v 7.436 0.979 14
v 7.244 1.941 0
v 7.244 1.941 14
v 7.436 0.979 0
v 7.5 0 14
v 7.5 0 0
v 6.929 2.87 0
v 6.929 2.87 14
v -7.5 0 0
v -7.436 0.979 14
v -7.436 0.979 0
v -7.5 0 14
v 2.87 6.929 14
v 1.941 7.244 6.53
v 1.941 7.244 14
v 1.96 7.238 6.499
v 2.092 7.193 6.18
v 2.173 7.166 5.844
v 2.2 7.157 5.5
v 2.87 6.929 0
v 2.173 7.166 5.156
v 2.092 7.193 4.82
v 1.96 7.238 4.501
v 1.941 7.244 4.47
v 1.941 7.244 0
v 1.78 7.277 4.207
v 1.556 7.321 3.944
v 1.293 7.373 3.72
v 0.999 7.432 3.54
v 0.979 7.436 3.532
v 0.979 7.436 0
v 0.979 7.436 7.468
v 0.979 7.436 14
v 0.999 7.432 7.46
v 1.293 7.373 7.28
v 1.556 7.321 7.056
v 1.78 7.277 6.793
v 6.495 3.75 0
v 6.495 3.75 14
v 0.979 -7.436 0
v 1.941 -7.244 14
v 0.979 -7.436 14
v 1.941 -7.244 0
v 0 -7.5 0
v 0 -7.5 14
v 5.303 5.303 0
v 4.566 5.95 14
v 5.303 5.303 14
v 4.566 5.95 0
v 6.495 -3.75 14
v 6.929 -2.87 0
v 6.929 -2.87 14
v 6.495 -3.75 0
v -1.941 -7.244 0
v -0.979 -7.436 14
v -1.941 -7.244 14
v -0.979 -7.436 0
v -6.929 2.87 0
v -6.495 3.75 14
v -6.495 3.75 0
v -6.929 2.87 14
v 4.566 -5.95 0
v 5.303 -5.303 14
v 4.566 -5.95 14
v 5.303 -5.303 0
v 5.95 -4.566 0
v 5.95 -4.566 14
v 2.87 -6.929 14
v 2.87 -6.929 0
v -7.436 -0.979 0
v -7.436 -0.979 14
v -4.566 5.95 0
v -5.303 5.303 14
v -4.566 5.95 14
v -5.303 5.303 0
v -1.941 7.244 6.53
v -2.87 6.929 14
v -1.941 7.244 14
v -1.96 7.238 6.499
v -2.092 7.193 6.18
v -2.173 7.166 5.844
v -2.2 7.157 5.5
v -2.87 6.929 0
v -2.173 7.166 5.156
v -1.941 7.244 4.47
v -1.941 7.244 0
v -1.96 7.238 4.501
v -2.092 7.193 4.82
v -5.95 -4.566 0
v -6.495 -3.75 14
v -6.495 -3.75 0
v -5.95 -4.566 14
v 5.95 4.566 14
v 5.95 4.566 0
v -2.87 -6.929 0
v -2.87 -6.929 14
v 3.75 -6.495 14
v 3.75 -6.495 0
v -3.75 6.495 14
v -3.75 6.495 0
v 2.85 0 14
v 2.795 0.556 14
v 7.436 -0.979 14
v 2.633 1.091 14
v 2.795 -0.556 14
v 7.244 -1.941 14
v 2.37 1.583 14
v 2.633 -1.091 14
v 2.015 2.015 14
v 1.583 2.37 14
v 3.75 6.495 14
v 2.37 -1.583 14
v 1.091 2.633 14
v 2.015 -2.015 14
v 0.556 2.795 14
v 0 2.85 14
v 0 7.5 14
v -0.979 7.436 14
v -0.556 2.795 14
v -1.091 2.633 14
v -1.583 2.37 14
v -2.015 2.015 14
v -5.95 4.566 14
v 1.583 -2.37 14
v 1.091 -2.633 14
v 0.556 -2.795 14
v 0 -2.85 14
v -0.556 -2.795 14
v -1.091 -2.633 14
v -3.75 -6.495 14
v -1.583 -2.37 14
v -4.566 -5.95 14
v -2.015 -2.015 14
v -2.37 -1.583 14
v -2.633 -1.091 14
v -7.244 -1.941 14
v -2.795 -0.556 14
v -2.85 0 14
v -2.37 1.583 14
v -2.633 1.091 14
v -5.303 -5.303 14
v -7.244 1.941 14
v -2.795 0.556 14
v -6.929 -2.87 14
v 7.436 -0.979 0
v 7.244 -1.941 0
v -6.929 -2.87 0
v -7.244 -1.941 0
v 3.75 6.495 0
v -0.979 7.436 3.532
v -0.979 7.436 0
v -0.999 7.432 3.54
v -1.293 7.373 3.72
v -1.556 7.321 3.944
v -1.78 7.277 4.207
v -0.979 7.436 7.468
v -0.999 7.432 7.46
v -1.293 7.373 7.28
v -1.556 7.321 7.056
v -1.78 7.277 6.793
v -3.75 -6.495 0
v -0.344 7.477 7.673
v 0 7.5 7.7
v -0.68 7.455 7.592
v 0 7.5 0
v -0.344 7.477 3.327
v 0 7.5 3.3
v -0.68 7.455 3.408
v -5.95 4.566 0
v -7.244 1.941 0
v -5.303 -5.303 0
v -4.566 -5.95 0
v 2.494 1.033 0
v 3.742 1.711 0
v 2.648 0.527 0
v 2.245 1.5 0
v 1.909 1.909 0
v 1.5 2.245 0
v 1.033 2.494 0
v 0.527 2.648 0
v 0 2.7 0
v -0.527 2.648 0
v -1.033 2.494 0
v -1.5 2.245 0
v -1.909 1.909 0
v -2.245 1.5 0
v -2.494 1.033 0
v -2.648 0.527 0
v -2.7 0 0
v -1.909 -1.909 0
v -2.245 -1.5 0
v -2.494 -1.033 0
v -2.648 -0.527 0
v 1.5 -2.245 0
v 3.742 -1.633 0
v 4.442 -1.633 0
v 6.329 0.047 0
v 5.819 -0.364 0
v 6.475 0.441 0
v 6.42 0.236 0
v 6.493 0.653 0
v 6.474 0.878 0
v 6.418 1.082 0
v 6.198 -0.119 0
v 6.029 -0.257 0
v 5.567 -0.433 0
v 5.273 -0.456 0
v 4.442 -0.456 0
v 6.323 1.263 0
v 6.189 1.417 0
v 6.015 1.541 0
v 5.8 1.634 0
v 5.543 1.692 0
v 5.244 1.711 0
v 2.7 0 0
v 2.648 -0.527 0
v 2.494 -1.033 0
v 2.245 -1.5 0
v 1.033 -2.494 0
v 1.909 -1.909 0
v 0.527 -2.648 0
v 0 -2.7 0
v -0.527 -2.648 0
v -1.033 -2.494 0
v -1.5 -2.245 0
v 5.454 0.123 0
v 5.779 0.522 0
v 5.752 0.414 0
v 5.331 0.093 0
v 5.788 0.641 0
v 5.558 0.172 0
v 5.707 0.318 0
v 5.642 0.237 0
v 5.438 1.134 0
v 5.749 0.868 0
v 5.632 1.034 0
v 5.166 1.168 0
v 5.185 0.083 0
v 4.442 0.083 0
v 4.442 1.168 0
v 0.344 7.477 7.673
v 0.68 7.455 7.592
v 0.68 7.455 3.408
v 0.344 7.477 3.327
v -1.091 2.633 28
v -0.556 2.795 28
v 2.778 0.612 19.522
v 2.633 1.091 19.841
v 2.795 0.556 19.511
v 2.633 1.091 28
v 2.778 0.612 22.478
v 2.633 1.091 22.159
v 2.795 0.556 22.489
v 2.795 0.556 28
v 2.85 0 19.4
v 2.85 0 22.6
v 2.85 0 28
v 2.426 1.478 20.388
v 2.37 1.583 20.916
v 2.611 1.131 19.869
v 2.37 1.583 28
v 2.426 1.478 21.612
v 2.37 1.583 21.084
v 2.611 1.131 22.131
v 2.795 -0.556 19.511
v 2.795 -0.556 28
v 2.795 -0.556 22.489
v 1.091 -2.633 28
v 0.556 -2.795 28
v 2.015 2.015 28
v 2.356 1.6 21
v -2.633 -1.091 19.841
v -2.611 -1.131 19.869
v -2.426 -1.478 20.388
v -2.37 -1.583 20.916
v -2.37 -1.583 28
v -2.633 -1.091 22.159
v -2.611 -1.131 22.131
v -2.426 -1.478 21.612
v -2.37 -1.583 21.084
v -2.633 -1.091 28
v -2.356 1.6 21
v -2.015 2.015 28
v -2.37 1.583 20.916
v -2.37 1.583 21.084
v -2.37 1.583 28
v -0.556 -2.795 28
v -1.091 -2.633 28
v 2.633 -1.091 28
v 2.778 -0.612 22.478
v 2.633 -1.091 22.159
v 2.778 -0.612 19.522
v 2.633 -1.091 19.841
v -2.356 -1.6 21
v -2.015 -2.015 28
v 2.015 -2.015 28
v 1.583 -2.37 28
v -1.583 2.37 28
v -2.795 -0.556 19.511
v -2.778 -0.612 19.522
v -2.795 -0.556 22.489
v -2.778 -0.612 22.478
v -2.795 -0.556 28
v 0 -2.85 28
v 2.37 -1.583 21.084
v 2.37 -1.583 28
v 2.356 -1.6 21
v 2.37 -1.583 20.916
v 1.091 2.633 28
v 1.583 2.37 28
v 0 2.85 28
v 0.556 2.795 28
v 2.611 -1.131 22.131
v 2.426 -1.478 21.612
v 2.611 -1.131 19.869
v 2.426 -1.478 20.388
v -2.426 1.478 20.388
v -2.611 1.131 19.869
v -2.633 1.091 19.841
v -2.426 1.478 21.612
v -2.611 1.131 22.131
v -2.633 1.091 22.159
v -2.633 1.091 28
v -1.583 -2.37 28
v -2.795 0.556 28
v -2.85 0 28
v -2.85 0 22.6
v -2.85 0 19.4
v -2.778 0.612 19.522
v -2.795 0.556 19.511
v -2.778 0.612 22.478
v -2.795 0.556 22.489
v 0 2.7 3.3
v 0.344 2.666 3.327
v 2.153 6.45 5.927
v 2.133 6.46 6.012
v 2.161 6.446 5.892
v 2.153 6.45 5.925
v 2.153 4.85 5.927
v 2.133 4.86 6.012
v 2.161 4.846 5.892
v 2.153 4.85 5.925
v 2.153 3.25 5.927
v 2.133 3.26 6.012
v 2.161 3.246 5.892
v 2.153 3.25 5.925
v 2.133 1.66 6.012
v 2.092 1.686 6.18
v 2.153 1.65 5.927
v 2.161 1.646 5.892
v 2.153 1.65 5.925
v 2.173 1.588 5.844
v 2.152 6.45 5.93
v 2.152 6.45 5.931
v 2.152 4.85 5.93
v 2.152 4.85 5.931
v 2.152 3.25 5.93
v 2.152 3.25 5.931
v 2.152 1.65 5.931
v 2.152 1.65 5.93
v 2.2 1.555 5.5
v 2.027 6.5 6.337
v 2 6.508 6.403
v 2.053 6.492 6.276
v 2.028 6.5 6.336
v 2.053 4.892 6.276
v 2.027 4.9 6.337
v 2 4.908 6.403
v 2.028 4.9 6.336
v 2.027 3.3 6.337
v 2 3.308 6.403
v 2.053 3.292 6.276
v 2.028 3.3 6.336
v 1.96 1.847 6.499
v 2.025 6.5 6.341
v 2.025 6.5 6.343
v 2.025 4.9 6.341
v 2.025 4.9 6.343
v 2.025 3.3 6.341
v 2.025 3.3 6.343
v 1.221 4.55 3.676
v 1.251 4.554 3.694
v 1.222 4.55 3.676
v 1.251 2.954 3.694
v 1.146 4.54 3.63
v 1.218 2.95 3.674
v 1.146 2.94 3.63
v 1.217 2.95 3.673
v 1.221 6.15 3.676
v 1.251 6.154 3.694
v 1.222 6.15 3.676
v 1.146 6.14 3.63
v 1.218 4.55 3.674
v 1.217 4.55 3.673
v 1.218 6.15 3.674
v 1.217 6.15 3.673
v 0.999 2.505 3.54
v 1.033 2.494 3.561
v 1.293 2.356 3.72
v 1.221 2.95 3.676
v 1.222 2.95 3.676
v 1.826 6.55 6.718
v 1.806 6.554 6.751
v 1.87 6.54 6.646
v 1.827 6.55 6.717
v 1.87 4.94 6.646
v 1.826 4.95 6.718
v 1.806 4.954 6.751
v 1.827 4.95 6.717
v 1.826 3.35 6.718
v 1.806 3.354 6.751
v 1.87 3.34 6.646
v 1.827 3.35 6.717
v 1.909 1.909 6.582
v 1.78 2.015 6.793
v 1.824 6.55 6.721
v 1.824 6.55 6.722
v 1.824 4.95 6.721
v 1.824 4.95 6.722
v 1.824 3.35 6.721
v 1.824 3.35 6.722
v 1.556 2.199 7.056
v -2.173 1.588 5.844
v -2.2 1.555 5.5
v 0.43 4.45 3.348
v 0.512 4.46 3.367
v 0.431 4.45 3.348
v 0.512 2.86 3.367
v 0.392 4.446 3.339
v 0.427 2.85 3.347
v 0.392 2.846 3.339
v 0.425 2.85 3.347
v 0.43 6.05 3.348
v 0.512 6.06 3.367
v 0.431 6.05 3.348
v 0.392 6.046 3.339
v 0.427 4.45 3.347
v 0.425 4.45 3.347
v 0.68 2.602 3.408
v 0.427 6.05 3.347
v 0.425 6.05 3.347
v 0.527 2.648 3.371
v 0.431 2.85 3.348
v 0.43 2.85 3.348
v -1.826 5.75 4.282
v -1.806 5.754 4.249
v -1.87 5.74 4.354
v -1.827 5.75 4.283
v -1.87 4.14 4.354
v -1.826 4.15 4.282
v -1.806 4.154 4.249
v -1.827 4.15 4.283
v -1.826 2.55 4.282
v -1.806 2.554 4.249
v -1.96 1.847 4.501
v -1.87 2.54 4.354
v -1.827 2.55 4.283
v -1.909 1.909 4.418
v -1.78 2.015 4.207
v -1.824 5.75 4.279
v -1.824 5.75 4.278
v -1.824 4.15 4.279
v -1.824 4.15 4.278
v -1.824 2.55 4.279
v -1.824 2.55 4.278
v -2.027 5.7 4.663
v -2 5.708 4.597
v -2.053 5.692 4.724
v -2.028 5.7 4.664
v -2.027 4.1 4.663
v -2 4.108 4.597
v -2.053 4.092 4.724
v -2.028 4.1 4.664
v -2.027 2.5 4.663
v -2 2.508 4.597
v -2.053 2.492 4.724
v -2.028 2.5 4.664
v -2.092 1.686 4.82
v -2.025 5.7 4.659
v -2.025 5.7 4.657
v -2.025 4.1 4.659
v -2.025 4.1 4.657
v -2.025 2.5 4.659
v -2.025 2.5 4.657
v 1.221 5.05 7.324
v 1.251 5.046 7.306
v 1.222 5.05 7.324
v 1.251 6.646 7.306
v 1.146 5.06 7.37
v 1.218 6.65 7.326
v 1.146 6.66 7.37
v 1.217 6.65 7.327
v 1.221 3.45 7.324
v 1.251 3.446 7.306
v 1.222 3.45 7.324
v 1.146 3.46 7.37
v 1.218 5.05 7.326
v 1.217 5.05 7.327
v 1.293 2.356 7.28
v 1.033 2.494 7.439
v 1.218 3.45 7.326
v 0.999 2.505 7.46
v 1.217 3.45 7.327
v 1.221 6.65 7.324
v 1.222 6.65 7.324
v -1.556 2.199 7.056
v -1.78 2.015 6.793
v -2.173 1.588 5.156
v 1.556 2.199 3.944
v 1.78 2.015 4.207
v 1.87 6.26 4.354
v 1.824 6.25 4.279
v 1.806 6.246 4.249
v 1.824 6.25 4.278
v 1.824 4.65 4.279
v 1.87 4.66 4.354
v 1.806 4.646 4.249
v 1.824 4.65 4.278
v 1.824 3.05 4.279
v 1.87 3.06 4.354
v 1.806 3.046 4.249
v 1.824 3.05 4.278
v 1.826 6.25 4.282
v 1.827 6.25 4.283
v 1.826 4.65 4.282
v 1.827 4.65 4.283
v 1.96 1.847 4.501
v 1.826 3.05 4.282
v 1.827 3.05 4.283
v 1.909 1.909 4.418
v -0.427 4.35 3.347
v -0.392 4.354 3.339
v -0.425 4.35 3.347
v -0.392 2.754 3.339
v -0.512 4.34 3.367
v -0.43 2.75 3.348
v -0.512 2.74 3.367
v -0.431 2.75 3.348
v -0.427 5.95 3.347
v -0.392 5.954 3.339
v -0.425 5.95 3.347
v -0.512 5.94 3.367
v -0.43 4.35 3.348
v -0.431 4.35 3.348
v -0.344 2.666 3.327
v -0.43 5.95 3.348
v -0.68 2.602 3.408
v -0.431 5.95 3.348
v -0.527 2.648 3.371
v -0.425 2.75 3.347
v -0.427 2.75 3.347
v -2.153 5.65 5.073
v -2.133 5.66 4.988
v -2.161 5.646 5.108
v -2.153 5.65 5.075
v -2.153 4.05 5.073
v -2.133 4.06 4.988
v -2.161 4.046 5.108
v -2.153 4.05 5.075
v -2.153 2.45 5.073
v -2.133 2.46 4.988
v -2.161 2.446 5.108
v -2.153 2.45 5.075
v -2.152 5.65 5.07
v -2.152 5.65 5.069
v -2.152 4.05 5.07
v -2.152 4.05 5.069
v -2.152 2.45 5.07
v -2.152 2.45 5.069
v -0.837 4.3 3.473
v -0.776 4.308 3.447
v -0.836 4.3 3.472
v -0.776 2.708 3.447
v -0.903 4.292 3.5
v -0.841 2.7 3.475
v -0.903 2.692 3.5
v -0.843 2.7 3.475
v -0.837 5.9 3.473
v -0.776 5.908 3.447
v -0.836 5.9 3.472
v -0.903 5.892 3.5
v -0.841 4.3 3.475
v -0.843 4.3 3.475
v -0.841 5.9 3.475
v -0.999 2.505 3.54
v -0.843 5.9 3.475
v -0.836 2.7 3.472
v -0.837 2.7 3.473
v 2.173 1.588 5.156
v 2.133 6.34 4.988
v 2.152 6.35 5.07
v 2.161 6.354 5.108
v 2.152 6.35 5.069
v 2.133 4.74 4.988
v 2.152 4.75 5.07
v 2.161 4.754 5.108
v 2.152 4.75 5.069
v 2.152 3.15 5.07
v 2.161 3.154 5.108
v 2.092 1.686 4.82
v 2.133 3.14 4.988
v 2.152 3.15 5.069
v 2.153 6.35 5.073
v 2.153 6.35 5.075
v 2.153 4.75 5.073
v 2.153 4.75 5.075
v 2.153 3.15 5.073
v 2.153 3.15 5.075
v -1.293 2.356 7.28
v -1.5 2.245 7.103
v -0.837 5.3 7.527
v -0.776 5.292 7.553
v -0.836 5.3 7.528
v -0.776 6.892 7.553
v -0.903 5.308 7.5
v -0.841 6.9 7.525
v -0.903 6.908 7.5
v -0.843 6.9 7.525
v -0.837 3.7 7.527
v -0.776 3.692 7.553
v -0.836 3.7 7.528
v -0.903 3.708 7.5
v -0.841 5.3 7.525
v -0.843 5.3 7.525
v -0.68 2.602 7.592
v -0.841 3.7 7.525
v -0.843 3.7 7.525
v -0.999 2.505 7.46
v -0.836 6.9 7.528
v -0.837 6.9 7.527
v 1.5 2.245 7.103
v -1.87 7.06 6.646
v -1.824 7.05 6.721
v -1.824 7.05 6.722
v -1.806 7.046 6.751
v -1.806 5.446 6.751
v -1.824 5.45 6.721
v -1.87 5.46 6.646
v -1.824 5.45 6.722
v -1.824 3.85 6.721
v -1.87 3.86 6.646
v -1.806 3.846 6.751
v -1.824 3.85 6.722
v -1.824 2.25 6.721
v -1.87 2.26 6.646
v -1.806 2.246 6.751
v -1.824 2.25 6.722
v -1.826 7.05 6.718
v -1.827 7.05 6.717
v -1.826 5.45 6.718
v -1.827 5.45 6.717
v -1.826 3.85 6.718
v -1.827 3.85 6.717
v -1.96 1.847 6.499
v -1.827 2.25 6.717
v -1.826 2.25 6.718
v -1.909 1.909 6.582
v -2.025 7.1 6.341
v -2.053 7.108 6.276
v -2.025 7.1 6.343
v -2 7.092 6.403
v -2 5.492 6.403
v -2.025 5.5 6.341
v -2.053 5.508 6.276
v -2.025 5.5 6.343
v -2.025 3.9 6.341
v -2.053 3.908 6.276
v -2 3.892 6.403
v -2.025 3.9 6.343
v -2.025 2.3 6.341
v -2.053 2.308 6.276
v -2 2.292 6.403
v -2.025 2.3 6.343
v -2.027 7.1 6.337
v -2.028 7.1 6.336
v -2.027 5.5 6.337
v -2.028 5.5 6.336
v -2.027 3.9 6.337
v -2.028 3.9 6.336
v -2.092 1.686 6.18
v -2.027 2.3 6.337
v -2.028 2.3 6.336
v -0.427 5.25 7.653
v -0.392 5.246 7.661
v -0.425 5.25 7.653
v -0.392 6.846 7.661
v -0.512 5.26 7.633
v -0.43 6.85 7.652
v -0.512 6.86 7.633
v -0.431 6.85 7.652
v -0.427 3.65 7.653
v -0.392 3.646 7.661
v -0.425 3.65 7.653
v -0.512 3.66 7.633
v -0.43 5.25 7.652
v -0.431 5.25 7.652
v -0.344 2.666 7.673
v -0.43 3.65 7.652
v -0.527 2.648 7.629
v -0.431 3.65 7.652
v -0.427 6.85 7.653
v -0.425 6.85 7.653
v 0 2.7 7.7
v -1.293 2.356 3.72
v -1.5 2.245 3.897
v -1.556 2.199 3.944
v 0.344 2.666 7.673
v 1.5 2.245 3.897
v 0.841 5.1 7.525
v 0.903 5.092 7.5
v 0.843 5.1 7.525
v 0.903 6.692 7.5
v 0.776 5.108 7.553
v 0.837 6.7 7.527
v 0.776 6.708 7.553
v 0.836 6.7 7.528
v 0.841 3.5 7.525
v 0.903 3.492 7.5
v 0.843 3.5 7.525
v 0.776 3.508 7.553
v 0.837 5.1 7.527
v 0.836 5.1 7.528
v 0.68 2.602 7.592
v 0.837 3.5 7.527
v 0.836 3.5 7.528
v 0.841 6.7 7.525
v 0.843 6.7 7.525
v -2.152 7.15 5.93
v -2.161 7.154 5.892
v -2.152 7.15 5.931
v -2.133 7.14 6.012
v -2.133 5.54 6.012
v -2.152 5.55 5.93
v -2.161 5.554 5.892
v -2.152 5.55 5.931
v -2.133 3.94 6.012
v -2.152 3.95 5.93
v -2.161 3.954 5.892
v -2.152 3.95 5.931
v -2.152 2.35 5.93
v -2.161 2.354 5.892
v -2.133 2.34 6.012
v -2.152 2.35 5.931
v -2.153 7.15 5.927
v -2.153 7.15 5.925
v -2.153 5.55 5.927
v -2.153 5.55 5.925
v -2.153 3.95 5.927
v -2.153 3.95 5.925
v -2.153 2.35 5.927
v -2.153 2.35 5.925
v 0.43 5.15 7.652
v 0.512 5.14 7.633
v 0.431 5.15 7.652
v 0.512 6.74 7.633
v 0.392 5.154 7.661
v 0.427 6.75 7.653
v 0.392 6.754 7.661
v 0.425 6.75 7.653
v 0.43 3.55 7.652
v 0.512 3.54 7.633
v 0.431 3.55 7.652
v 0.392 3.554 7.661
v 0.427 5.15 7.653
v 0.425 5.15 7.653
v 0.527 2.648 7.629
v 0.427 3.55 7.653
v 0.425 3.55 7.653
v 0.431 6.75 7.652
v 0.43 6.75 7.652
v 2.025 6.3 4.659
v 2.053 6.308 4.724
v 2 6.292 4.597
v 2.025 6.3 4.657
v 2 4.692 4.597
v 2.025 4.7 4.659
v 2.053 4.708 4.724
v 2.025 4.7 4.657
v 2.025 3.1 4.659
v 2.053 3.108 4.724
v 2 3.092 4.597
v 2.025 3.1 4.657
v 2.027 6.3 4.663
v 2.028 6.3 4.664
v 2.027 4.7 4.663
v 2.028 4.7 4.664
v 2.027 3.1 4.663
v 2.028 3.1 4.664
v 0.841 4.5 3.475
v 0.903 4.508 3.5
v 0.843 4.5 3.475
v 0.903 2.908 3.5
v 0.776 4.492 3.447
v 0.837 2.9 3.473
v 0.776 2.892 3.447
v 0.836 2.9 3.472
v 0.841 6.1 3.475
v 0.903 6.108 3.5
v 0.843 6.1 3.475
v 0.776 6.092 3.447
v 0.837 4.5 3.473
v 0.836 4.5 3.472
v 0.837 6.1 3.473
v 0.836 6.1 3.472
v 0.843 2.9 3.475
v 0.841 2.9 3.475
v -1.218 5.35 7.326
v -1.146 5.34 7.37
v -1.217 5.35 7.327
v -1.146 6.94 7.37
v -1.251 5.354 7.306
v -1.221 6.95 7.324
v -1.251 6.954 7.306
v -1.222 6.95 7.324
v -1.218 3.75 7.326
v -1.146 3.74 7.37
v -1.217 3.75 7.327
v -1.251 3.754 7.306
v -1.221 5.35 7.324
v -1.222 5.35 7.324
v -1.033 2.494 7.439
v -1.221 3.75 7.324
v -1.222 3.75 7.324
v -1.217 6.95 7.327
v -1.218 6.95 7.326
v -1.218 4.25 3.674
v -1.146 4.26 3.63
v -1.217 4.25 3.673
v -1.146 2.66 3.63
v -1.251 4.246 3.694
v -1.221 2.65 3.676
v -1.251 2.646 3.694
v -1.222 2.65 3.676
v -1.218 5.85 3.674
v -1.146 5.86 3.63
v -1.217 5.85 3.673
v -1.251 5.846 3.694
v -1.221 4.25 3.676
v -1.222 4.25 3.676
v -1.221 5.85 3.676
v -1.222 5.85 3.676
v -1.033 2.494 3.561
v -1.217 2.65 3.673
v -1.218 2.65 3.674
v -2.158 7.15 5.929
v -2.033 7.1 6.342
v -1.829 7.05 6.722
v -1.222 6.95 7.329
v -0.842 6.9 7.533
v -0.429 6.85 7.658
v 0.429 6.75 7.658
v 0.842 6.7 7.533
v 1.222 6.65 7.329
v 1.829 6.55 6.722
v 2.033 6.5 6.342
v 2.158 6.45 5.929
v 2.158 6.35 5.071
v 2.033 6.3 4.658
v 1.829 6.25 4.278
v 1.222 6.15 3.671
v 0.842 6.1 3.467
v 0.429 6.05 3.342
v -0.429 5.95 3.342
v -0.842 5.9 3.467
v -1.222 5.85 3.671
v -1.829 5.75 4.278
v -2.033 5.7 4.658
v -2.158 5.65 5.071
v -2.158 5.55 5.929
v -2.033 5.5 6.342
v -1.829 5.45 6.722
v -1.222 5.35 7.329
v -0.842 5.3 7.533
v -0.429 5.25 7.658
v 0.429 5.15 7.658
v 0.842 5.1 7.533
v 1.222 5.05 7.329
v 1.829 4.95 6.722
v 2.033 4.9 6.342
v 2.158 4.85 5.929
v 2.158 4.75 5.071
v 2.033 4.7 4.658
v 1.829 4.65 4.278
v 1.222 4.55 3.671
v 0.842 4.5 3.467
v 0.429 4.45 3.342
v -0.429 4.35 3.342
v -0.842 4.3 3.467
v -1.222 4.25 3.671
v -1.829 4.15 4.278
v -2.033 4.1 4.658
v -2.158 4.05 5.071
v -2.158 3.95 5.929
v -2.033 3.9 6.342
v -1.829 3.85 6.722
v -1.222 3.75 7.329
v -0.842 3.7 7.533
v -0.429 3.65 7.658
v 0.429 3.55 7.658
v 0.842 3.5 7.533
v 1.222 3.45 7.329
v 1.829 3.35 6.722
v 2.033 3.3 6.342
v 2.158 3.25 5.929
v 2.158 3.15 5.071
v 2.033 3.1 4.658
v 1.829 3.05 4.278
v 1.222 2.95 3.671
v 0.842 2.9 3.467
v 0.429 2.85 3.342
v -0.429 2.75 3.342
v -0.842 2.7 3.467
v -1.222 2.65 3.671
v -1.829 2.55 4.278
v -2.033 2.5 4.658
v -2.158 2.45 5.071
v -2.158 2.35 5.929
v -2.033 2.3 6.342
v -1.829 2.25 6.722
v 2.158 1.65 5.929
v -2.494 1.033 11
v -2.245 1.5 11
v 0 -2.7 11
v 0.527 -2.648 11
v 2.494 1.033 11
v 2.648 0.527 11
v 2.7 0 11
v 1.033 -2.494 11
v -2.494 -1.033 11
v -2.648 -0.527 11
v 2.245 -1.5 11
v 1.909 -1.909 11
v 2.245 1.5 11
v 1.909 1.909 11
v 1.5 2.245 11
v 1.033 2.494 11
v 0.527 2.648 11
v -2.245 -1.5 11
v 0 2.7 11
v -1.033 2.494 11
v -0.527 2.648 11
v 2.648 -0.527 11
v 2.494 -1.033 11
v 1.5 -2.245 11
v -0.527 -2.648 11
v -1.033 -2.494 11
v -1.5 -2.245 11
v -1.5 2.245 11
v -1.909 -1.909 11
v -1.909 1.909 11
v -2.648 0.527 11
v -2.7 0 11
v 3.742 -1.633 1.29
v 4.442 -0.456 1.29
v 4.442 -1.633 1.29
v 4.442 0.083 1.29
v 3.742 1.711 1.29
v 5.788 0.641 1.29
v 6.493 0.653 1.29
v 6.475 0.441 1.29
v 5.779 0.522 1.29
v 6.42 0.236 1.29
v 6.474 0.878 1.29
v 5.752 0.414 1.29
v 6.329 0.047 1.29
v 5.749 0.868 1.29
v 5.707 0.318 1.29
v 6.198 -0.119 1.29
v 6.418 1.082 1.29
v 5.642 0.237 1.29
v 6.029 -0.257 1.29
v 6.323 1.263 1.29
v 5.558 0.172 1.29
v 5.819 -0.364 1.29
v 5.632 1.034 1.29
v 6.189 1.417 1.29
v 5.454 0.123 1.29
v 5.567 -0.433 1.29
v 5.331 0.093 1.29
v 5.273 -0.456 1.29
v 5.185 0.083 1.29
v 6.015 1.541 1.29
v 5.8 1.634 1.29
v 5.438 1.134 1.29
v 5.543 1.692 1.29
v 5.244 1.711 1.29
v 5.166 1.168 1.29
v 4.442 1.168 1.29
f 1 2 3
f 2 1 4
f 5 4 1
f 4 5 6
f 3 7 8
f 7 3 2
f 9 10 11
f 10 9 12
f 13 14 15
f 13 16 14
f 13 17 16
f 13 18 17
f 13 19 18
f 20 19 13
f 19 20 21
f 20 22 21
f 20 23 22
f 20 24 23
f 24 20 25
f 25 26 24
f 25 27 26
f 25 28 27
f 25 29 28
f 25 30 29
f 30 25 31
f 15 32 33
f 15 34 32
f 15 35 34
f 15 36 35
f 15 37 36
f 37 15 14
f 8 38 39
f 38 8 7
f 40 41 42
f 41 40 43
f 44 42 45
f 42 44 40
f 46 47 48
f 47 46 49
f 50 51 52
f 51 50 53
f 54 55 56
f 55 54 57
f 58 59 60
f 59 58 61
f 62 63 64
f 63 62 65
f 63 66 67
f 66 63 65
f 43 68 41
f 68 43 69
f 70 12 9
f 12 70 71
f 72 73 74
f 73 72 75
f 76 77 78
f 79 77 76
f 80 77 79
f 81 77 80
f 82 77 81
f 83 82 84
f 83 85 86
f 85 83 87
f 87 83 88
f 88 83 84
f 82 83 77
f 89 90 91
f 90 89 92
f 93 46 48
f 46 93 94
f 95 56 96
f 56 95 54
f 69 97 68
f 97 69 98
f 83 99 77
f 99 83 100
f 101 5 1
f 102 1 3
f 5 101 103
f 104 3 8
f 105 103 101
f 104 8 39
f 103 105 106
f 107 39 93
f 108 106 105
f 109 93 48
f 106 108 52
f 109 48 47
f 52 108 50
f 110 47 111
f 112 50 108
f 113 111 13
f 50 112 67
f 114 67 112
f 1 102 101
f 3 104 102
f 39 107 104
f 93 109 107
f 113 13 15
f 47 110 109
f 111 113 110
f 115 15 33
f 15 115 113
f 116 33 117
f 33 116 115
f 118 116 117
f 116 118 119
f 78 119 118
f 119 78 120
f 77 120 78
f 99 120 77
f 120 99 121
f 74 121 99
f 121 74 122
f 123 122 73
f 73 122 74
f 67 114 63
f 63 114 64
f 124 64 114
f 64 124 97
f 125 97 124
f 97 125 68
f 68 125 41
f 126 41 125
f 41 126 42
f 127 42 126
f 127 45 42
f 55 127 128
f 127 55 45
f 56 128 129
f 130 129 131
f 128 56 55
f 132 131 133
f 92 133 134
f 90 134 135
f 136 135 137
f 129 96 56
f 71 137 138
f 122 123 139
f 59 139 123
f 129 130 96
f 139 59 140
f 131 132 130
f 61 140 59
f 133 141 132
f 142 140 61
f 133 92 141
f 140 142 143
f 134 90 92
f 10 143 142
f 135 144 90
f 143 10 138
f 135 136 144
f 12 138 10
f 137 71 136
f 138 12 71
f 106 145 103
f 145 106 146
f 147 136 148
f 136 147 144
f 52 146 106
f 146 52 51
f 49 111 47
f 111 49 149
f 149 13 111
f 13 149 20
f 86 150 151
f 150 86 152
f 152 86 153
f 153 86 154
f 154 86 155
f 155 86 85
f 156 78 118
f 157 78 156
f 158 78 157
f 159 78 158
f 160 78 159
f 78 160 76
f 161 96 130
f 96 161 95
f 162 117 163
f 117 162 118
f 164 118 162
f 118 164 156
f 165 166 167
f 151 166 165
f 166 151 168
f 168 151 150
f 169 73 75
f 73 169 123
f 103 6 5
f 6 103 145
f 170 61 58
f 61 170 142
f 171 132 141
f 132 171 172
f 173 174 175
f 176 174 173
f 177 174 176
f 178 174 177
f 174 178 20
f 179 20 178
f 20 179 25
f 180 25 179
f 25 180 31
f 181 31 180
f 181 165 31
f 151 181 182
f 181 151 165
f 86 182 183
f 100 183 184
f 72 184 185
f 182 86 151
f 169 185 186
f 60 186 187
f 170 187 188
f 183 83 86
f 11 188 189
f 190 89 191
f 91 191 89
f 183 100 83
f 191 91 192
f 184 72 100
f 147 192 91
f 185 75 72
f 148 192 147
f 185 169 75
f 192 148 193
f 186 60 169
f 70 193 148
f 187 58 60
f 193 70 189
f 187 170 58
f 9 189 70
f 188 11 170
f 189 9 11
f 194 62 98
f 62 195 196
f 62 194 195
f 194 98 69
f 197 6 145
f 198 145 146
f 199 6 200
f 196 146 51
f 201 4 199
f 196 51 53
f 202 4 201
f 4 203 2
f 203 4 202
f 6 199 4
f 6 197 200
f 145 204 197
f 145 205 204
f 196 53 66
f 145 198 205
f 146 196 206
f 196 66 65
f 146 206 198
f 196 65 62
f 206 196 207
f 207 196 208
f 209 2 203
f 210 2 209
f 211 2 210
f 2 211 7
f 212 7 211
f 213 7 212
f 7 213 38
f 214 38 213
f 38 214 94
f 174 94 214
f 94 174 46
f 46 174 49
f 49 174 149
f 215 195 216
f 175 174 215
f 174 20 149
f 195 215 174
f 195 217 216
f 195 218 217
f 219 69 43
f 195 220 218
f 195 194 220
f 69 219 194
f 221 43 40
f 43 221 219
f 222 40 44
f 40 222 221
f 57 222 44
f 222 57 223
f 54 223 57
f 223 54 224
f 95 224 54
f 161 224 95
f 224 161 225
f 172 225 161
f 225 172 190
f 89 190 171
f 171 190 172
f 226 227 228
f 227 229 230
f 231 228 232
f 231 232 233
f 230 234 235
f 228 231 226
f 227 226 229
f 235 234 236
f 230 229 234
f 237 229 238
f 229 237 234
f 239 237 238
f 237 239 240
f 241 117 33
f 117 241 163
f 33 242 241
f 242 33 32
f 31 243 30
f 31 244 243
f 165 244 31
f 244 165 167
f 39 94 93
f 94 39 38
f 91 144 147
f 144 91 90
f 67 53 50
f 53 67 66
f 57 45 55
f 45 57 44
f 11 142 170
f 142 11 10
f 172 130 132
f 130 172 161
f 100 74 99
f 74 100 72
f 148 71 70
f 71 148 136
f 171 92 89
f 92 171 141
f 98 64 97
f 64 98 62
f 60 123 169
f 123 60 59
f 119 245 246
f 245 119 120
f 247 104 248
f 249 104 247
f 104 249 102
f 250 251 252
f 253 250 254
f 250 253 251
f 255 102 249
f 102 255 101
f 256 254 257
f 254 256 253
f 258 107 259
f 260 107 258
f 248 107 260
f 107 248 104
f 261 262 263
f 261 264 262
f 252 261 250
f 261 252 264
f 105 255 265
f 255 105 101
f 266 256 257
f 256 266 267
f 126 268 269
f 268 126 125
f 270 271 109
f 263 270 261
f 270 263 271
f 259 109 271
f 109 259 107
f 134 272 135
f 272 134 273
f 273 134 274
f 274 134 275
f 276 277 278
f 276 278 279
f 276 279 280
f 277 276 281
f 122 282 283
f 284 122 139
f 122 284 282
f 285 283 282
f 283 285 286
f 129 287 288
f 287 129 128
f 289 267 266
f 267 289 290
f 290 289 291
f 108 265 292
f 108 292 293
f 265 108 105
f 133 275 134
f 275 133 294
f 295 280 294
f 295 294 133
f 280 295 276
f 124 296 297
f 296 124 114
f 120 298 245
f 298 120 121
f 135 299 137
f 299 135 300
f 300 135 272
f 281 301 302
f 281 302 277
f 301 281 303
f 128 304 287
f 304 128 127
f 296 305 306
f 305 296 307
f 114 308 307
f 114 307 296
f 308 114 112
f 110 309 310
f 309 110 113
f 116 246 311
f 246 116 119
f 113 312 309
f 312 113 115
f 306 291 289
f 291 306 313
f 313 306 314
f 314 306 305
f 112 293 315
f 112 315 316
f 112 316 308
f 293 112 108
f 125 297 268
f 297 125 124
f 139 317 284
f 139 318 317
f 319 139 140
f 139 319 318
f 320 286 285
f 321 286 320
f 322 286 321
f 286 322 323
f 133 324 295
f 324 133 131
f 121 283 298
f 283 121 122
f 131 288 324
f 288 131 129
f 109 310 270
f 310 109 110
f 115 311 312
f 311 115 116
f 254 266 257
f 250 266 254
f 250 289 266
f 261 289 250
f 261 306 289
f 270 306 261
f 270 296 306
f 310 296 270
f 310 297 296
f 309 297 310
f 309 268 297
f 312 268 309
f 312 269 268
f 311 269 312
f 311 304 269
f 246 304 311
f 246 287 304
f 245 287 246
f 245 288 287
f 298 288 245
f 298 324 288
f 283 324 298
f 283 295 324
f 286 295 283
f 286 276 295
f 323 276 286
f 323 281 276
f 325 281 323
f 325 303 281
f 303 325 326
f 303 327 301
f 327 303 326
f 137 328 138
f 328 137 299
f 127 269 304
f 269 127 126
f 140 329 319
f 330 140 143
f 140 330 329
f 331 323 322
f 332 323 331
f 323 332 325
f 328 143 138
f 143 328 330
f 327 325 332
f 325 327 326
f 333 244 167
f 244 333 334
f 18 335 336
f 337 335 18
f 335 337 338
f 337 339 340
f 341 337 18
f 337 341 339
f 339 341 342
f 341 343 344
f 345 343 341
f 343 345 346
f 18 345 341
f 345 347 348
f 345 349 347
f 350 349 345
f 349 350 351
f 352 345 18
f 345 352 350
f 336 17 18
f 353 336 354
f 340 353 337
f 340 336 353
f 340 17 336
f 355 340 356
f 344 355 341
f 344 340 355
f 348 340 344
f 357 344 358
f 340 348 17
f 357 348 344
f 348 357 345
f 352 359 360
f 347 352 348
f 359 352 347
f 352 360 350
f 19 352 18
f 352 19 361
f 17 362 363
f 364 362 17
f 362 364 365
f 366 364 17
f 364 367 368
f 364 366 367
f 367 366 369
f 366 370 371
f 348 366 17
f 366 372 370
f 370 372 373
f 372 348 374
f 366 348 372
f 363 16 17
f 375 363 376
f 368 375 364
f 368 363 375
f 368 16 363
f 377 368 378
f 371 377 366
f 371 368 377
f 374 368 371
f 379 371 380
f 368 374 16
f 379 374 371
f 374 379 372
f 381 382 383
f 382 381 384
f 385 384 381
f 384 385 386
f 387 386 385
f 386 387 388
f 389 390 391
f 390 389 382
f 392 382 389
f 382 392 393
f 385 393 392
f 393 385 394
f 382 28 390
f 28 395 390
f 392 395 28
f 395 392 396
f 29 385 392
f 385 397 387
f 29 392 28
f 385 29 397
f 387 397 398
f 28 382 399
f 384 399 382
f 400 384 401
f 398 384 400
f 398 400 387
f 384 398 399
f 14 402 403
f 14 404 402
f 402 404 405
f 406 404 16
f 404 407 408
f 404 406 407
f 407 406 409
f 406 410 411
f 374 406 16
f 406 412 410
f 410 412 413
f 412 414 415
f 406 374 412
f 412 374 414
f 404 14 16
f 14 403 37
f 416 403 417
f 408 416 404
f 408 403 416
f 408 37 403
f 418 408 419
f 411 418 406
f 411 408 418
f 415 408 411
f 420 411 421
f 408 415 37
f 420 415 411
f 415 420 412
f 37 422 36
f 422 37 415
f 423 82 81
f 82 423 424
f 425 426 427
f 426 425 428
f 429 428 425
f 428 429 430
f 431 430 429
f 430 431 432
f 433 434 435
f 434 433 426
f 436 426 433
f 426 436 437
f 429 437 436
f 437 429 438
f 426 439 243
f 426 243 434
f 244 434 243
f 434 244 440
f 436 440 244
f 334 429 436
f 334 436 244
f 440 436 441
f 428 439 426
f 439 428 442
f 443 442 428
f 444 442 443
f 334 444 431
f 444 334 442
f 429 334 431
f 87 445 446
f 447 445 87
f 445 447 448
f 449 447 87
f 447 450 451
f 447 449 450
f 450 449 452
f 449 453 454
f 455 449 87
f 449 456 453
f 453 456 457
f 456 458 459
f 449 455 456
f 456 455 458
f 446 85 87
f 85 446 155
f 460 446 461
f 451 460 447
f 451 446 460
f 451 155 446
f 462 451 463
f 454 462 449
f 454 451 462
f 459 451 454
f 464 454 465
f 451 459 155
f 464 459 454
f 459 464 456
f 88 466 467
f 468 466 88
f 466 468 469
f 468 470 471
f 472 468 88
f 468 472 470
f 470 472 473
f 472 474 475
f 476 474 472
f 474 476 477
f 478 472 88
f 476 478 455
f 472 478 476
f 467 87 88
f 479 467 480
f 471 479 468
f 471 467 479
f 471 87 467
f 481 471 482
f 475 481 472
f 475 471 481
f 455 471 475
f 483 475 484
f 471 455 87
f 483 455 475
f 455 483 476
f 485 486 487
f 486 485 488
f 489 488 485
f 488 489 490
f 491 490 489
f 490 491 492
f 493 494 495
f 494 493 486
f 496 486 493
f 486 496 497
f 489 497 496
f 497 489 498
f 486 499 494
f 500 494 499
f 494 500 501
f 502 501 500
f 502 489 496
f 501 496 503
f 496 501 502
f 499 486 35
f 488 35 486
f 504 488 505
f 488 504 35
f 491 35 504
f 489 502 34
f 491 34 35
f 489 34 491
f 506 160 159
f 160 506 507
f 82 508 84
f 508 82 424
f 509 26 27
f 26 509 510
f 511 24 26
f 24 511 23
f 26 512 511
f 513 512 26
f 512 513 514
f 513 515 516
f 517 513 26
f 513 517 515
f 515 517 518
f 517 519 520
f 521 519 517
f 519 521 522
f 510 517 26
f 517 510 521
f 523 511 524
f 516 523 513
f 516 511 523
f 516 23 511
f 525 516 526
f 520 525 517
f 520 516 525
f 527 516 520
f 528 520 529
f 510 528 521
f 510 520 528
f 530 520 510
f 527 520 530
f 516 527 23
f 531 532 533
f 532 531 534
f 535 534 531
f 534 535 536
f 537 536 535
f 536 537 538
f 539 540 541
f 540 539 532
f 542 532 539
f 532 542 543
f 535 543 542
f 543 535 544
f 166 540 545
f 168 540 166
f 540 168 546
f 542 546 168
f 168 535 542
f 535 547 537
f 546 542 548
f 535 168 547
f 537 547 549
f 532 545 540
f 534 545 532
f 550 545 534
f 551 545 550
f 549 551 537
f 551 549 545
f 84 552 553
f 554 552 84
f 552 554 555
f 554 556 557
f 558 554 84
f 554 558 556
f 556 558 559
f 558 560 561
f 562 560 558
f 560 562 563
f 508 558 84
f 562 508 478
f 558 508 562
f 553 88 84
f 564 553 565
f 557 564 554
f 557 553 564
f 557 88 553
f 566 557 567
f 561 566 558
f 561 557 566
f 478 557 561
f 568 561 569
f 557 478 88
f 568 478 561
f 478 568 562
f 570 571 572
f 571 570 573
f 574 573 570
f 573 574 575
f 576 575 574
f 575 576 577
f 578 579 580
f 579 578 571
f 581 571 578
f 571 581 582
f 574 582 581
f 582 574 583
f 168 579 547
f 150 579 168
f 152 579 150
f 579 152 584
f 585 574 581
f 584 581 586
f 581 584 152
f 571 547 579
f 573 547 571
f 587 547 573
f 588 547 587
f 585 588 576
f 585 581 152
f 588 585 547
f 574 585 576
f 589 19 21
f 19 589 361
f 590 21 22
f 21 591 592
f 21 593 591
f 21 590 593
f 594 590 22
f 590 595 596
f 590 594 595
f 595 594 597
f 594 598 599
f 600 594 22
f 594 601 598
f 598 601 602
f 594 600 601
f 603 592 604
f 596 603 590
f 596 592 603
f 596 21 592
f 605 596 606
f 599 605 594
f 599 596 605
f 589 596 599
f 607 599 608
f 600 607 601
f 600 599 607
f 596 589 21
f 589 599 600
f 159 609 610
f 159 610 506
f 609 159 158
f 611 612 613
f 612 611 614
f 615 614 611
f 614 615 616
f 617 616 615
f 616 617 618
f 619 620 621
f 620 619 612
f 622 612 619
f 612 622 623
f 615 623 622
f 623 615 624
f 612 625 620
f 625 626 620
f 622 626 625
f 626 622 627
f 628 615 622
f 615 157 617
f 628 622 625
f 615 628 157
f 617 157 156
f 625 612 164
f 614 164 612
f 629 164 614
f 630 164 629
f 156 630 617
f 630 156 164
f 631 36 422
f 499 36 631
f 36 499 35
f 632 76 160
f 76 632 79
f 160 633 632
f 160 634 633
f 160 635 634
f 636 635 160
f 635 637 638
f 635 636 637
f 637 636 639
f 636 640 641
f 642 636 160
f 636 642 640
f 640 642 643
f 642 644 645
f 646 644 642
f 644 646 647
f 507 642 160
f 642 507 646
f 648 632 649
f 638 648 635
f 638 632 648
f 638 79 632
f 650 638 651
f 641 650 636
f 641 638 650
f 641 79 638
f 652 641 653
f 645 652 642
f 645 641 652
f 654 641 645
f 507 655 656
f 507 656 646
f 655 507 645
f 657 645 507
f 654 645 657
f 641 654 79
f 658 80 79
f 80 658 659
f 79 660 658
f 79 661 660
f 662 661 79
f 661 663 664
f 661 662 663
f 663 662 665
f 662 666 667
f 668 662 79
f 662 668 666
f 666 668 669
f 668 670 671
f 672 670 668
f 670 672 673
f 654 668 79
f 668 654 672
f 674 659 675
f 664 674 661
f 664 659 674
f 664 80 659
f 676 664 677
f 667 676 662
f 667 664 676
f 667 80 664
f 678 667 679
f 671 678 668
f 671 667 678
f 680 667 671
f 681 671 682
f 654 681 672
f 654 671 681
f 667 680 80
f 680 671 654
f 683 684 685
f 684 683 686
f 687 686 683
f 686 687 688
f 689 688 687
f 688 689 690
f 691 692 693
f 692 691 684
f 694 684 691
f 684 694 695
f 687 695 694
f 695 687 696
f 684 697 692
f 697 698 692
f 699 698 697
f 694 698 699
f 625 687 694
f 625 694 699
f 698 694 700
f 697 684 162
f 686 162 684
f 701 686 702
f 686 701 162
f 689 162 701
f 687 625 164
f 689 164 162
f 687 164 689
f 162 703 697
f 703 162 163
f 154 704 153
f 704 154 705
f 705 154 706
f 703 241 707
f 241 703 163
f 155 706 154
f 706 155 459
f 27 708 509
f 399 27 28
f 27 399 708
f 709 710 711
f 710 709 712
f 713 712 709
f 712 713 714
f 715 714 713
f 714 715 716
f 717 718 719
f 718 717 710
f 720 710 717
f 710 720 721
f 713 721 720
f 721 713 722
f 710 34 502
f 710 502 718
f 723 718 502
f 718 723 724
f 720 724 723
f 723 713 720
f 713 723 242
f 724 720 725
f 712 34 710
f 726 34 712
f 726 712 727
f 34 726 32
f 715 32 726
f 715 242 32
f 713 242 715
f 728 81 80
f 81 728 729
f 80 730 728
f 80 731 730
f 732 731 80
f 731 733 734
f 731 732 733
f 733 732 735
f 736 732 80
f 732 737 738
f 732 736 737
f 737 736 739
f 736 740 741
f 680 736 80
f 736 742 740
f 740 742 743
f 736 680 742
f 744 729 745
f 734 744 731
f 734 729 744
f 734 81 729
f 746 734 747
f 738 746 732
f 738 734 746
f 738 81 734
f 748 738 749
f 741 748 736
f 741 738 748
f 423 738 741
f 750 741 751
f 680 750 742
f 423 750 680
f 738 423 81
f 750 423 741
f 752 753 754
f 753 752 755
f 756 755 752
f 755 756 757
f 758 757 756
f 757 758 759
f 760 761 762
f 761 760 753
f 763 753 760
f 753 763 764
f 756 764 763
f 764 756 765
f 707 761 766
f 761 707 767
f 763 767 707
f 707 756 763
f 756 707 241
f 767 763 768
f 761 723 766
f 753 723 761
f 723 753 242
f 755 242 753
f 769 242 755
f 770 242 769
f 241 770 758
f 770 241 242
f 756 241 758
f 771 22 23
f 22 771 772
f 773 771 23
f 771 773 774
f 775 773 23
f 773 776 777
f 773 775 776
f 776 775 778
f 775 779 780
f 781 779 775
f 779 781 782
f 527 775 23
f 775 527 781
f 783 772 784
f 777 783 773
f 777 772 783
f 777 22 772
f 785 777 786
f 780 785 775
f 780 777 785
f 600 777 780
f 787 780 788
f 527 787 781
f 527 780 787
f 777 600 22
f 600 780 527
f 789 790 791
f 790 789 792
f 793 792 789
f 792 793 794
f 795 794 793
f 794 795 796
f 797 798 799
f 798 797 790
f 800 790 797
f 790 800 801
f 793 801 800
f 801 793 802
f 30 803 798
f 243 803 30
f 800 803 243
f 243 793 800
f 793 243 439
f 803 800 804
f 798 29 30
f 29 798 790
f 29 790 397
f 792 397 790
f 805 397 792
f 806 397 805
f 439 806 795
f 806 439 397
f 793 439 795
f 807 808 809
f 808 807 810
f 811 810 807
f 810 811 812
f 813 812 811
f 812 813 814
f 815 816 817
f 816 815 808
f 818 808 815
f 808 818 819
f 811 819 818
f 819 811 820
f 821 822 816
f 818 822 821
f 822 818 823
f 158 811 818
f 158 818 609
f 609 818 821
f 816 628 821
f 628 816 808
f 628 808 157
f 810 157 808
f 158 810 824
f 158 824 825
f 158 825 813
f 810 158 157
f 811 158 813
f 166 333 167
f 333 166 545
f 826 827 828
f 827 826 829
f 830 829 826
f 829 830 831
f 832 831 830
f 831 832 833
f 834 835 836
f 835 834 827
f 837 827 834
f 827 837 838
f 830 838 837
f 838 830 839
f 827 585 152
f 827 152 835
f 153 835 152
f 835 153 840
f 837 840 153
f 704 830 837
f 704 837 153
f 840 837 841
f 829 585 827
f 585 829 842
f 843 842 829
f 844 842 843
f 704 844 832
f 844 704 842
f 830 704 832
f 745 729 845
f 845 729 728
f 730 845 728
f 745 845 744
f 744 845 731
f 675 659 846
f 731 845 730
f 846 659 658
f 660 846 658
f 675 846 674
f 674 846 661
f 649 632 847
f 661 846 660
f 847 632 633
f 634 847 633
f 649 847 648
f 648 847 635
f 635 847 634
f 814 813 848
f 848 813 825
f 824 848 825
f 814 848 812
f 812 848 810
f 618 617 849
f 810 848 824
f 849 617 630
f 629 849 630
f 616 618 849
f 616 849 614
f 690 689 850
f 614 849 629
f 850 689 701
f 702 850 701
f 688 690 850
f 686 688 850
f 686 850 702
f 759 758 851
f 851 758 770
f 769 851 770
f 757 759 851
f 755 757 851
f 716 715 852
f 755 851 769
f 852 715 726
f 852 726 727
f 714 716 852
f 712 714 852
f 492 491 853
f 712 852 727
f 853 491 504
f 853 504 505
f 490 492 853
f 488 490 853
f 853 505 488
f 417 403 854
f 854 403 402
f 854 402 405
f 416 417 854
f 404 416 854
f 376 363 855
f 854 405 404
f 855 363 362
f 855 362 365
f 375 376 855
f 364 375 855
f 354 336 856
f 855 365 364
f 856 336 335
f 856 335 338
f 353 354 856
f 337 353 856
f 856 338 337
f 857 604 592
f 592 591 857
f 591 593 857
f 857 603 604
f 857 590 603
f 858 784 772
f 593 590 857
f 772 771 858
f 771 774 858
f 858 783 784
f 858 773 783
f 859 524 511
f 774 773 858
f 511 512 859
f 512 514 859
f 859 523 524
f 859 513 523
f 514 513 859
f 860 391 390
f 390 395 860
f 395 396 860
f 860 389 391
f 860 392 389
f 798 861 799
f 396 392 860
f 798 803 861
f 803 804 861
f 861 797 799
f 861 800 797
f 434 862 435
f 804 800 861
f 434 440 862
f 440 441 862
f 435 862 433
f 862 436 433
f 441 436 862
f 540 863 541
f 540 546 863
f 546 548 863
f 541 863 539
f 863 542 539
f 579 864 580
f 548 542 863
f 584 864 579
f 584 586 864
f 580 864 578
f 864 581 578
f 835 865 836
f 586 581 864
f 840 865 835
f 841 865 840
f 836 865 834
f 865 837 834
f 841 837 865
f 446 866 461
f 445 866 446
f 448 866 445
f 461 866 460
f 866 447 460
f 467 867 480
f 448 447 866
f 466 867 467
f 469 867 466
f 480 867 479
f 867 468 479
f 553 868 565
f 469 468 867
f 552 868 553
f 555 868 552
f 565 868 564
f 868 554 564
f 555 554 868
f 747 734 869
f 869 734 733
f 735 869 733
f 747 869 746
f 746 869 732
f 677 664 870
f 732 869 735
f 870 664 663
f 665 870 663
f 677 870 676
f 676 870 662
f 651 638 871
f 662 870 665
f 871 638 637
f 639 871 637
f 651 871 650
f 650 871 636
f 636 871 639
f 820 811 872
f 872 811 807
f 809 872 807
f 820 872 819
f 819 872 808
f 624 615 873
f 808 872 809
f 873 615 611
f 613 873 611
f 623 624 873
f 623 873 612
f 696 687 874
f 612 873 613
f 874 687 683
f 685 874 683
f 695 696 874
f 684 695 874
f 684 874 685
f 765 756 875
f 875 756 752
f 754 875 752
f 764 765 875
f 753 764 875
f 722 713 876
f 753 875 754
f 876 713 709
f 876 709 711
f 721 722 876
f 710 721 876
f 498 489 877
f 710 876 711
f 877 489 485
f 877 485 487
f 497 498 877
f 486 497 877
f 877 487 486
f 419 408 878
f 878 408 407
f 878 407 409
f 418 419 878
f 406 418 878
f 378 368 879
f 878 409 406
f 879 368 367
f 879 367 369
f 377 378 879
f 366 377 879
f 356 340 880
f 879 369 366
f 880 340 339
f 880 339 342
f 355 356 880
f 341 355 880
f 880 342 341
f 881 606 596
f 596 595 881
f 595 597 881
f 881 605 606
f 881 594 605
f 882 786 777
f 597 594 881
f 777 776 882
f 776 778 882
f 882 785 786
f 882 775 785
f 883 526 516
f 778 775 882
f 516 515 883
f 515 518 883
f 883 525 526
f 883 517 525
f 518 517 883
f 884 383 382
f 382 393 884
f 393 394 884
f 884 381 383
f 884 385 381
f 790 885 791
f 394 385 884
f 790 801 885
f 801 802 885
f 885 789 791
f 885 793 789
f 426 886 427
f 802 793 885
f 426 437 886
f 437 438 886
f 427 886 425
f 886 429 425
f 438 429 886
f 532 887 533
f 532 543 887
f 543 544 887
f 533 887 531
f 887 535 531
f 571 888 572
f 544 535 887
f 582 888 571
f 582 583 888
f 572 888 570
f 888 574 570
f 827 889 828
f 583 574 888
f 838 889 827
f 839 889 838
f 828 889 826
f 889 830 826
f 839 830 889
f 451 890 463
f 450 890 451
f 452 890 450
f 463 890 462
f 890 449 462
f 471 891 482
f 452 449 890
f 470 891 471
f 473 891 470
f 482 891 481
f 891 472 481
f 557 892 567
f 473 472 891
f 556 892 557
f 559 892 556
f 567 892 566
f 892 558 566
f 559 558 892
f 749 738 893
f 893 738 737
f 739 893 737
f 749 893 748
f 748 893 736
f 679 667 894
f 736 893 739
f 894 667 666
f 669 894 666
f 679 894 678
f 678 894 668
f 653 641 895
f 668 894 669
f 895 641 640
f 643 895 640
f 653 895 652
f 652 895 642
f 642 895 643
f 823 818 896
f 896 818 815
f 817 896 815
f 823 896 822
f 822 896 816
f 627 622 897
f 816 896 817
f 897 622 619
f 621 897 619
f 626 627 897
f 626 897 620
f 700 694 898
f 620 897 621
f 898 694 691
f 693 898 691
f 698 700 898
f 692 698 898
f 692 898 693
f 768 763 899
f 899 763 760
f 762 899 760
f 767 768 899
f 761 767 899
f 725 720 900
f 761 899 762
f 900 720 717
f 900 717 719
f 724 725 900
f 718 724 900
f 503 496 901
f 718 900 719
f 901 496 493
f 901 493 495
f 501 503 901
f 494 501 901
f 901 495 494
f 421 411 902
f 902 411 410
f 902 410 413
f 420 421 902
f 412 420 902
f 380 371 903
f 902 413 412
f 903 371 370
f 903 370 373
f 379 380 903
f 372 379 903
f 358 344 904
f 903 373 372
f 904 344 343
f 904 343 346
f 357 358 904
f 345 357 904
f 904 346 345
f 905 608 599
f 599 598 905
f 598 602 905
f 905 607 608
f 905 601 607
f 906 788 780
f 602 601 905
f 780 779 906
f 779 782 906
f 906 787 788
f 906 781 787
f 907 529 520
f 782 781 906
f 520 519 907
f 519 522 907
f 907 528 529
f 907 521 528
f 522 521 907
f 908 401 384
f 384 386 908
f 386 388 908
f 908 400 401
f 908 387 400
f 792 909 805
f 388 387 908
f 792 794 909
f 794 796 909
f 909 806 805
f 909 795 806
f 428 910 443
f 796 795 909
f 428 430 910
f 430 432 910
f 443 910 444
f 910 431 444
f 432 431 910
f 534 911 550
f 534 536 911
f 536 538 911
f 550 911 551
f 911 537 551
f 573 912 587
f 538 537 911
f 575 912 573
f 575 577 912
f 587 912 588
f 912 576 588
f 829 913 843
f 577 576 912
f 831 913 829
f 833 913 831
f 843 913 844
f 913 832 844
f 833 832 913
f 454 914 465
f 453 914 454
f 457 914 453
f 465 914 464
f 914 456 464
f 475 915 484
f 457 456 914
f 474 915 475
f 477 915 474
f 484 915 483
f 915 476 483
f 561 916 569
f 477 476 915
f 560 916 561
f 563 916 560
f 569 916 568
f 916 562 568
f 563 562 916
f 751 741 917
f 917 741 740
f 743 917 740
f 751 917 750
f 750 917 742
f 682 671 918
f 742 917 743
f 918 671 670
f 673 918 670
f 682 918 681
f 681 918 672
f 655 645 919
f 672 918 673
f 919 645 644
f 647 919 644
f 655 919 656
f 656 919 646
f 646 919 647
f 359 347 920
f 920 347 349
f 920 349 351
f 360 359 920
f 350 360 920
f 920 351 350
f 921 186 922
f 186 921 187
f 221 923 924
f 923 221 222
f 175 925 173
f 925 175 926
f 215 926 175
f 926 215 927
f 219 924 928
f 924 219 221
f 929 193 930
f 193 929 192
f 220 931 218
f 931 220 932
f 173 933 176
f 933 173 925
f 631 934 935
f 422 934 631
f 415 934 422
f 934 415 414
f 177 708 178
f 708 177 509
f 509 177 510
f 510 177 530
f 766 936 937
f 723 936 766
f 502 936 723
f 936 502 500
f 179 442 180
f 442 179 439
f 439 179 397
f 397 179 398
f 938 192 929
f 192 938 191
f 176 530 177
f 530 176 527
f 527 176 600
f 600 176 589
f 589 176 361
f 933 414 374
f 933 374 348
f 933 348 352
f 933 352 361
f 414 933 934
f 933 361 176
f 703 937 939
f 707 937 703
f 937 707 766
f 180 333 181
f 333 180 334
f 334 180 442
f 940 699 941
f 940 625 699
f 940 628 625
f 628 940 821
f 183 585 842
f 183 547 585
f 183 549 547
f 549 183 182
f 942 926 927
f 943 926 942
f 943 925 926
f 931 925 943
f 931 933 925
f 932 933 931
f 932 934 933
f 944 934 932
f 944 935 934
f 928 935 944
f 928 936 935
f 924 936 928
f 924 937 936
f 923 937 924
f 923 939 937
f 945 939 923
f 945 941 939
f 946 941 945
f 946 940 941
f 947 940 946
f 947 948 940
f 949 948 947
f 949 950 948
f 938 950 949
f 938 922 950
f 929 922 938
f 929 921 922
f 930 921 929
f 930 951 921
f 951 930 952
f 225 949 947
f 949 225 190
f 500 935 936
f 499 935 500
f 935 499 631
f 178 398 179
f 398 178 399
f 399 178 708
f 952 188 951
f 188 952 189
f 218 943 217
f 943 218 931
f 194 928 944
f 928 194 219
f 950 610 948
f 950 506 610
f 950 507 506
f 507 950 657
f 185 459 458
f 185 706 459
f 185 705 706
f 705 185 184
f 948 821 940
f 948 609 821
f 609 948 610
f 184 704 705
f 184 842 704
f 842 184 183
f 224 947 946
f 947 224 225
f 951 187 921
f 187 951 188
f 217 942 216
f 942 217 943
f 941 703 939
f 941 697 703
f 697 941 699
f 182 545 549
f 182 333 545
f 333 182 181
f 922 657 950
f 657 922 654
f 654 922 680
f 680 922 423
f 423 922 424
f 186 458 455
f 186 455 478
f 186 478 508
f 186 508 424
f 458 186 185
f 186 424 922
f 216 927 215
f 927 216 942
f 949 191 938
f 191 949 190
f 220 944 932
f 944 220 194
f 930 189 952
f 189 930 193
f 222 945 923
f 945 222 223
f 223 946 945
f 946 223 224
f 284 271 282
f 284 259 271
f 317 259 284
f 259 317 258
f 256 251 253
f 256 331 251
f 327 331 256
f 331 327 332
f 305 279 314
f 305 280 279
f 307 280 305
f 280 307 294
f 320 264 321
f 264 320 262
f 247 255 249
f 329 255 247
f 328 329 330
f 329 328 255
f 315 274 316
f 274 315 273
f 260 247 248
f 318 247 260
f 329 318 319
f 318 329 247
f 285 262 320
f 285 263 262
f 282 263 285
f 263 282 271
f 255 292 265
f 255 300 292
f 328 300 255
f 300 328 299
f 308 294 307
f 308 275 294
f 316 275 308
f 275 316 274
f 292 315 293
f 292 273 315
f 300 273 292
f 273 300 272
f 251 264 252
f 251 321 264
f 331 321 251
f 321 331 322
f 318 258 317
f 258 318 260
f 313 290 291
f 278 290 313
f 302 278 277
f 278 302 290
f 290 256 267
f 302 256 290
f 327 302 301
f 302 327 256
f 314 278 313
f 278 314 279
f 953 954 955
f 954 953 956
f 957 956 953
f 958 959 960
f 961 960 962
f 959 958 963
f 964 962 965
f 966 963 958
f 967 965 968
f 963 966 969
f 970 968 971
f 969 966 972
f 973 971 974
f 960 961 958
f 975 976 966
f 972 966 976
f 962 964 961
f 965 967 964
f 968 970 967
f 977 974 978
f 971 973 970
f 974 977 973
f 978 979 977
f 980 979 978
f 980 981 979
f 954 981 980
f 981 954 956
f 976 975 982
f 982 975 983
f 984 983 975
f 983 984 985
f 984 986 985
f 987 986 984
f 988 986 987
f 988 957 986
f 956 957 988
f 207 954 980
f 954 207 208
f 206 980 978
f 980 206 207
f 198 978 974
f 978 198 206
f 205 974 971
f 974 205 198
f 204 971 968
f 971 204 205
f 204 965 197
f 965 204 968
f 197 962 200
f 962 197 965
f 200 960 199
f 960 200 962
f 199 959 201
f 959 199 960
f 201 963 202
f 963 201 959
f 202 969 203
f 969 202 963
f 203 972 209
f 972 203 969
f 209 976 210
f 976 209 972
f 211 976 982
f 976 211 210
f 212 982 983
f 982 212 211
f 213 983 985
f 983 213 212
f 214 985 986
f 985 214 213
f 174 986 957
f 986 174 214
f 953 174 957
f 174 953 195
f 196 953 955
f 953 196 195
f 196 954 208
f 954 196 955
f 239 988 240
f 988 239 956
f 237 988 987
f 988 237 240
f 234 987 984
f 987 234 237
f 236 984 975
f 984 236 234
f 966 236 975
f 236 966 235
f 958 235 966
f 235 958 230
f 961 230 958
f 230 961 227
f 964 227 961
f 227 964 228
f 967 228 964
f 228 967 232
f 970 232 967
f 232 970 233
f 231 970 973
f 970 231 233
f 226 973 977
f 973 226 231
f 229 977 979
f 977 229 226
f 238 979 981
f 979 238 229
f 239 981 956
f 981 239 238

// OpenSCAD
// Accoppiatore stampato albero motore <-> rullo — stampa 1x. Sostituisce
// il giunto flessibile comprato: lato motore un foro con un grano
// (vite in miniatura stampata, helpers.scad) che preme sull'alberino;
// lato rullo uno stelo che entra nel foro albero del rullo (shaft_d,
// roller.scad) e viene bloccato dalla stessa spina trasversale che il
// rullo aveva già (roller_pin_z in params.scad) — uno spezzone di filo/
// chiodo da 3mm, o una spina stampata a pressione, non serve altro.
//
// ATTENZIONE — è il pezzo più sperimentale di questa revisione: un grano
// premuto su un albero liscio è una tecnica comune per pulegge/ingranaggi
// stampati (attrito/carico bassi come qui), ma non è stato possibile
// stampare e provare questo pezzo sotto carico reale in questa sessione.
// Collauda a vuoto (vedi il passo 12 in 3d-print/README.md) prima di
// fidartene per l'uso quotidiano; se noti slittamento, la soluzione di
// riserva resta il giunto flessibile comprato in bom.md.
//
// MISURA IL TUO MOTORE: motor_shaft_d in params.scad assume 5mm (tipico
// NEMA17) — controlla il datasheet del tuo motore prima di stampare.
include <params.scad>
include <helpers.scad>

motor_bore_d = motor_shaft_d + coupler_motor_clear;
roller_stub_d = shaft_d - 2*coupler_roller_clear;
total_len = coupler_motor_len + coupler_septum_t + coupler_roller_len;

module coupler() {
    difference() {
        union() {
            // corpo principale: contiene il foro lato motore + il setto pieno
            cylinder(d = coupler_od, h = coupler_motor_len + coupler_septum_t, $fn = 48);
            // stelo lato rullo, più stretto, sporge dall'altra estremità
            translate([0, 0, coupler_motor_len + coupler_septum_t])
                cylinder(d = roller_stub_d, h = coupler_roller_len, $fn = 32);
        }
        // foro cieco lato motore
        translate([0, 0, -0.5])
            cylinder(d = motor_bore_d, h = coupler_motor_len + 0.5, $fn = 32);
        // grano di bloccaggio: preme radialmente sull'alberino motore, a
        // metà della profondità del foro — rotate([90,0,0]) manda
        // l'estrusione nativa di printed_screw_hole (lungo +Z) lungo -Y,
        // quindi partendo da fuori il pezzo (y = od/2+0.5) e con lunghezza
        // od/2+0.5 arriva esattamente al centro (stessa tecnica verificata
        // per i fori di taglio nei fianchi/pannello frontale).
        translate([0, coupler_od/2 + 0.5, coupler_motor_len/2])
            rotate([90, 0, 0])
                printed_screw_hole(coupler_od/2 + 0.5, d = grub_d, pitch = grub_pitch,
                                    tooth_h = grub_tooth_h, clearance = grub_clearance);
        // foro per la spina di bloccaggio lato rullo — alla stessa quota
        // (roller_pin_z, misurata dall'inizio dello stelo) del foro
        // trasversale già presente in roller.scad, così i due combaciano
        // una volta infilato lo stelo nel rullo
        translate([-coupler_od/2 - 1, 0, coupler_motor_len + coupler_septum_t + roller_pin_z])
            rotate([0, 90, 0])
                cylinder(d = coupler_pin_d, h = coupler_od + 2, $fn = 16);
        // Lettera "P" (vedi assembly-guide.md): incisa sulla faccia
        // accessibile lato motore (z=0, il pezzo è pieno per z>0 —
        // direzione opposta a label_cut, che assume materiale sotto ztop
        // non sopra, quindi qui il taglio va scritto a mano)
        translate([5, 0, -0.01])
            linear_extrude(height = 1.3)
                text("P", size = 3.5, halign = "center", valign = "center",
                     font = "Liberation Sans:style=Bold");
    }
}

coupler();
